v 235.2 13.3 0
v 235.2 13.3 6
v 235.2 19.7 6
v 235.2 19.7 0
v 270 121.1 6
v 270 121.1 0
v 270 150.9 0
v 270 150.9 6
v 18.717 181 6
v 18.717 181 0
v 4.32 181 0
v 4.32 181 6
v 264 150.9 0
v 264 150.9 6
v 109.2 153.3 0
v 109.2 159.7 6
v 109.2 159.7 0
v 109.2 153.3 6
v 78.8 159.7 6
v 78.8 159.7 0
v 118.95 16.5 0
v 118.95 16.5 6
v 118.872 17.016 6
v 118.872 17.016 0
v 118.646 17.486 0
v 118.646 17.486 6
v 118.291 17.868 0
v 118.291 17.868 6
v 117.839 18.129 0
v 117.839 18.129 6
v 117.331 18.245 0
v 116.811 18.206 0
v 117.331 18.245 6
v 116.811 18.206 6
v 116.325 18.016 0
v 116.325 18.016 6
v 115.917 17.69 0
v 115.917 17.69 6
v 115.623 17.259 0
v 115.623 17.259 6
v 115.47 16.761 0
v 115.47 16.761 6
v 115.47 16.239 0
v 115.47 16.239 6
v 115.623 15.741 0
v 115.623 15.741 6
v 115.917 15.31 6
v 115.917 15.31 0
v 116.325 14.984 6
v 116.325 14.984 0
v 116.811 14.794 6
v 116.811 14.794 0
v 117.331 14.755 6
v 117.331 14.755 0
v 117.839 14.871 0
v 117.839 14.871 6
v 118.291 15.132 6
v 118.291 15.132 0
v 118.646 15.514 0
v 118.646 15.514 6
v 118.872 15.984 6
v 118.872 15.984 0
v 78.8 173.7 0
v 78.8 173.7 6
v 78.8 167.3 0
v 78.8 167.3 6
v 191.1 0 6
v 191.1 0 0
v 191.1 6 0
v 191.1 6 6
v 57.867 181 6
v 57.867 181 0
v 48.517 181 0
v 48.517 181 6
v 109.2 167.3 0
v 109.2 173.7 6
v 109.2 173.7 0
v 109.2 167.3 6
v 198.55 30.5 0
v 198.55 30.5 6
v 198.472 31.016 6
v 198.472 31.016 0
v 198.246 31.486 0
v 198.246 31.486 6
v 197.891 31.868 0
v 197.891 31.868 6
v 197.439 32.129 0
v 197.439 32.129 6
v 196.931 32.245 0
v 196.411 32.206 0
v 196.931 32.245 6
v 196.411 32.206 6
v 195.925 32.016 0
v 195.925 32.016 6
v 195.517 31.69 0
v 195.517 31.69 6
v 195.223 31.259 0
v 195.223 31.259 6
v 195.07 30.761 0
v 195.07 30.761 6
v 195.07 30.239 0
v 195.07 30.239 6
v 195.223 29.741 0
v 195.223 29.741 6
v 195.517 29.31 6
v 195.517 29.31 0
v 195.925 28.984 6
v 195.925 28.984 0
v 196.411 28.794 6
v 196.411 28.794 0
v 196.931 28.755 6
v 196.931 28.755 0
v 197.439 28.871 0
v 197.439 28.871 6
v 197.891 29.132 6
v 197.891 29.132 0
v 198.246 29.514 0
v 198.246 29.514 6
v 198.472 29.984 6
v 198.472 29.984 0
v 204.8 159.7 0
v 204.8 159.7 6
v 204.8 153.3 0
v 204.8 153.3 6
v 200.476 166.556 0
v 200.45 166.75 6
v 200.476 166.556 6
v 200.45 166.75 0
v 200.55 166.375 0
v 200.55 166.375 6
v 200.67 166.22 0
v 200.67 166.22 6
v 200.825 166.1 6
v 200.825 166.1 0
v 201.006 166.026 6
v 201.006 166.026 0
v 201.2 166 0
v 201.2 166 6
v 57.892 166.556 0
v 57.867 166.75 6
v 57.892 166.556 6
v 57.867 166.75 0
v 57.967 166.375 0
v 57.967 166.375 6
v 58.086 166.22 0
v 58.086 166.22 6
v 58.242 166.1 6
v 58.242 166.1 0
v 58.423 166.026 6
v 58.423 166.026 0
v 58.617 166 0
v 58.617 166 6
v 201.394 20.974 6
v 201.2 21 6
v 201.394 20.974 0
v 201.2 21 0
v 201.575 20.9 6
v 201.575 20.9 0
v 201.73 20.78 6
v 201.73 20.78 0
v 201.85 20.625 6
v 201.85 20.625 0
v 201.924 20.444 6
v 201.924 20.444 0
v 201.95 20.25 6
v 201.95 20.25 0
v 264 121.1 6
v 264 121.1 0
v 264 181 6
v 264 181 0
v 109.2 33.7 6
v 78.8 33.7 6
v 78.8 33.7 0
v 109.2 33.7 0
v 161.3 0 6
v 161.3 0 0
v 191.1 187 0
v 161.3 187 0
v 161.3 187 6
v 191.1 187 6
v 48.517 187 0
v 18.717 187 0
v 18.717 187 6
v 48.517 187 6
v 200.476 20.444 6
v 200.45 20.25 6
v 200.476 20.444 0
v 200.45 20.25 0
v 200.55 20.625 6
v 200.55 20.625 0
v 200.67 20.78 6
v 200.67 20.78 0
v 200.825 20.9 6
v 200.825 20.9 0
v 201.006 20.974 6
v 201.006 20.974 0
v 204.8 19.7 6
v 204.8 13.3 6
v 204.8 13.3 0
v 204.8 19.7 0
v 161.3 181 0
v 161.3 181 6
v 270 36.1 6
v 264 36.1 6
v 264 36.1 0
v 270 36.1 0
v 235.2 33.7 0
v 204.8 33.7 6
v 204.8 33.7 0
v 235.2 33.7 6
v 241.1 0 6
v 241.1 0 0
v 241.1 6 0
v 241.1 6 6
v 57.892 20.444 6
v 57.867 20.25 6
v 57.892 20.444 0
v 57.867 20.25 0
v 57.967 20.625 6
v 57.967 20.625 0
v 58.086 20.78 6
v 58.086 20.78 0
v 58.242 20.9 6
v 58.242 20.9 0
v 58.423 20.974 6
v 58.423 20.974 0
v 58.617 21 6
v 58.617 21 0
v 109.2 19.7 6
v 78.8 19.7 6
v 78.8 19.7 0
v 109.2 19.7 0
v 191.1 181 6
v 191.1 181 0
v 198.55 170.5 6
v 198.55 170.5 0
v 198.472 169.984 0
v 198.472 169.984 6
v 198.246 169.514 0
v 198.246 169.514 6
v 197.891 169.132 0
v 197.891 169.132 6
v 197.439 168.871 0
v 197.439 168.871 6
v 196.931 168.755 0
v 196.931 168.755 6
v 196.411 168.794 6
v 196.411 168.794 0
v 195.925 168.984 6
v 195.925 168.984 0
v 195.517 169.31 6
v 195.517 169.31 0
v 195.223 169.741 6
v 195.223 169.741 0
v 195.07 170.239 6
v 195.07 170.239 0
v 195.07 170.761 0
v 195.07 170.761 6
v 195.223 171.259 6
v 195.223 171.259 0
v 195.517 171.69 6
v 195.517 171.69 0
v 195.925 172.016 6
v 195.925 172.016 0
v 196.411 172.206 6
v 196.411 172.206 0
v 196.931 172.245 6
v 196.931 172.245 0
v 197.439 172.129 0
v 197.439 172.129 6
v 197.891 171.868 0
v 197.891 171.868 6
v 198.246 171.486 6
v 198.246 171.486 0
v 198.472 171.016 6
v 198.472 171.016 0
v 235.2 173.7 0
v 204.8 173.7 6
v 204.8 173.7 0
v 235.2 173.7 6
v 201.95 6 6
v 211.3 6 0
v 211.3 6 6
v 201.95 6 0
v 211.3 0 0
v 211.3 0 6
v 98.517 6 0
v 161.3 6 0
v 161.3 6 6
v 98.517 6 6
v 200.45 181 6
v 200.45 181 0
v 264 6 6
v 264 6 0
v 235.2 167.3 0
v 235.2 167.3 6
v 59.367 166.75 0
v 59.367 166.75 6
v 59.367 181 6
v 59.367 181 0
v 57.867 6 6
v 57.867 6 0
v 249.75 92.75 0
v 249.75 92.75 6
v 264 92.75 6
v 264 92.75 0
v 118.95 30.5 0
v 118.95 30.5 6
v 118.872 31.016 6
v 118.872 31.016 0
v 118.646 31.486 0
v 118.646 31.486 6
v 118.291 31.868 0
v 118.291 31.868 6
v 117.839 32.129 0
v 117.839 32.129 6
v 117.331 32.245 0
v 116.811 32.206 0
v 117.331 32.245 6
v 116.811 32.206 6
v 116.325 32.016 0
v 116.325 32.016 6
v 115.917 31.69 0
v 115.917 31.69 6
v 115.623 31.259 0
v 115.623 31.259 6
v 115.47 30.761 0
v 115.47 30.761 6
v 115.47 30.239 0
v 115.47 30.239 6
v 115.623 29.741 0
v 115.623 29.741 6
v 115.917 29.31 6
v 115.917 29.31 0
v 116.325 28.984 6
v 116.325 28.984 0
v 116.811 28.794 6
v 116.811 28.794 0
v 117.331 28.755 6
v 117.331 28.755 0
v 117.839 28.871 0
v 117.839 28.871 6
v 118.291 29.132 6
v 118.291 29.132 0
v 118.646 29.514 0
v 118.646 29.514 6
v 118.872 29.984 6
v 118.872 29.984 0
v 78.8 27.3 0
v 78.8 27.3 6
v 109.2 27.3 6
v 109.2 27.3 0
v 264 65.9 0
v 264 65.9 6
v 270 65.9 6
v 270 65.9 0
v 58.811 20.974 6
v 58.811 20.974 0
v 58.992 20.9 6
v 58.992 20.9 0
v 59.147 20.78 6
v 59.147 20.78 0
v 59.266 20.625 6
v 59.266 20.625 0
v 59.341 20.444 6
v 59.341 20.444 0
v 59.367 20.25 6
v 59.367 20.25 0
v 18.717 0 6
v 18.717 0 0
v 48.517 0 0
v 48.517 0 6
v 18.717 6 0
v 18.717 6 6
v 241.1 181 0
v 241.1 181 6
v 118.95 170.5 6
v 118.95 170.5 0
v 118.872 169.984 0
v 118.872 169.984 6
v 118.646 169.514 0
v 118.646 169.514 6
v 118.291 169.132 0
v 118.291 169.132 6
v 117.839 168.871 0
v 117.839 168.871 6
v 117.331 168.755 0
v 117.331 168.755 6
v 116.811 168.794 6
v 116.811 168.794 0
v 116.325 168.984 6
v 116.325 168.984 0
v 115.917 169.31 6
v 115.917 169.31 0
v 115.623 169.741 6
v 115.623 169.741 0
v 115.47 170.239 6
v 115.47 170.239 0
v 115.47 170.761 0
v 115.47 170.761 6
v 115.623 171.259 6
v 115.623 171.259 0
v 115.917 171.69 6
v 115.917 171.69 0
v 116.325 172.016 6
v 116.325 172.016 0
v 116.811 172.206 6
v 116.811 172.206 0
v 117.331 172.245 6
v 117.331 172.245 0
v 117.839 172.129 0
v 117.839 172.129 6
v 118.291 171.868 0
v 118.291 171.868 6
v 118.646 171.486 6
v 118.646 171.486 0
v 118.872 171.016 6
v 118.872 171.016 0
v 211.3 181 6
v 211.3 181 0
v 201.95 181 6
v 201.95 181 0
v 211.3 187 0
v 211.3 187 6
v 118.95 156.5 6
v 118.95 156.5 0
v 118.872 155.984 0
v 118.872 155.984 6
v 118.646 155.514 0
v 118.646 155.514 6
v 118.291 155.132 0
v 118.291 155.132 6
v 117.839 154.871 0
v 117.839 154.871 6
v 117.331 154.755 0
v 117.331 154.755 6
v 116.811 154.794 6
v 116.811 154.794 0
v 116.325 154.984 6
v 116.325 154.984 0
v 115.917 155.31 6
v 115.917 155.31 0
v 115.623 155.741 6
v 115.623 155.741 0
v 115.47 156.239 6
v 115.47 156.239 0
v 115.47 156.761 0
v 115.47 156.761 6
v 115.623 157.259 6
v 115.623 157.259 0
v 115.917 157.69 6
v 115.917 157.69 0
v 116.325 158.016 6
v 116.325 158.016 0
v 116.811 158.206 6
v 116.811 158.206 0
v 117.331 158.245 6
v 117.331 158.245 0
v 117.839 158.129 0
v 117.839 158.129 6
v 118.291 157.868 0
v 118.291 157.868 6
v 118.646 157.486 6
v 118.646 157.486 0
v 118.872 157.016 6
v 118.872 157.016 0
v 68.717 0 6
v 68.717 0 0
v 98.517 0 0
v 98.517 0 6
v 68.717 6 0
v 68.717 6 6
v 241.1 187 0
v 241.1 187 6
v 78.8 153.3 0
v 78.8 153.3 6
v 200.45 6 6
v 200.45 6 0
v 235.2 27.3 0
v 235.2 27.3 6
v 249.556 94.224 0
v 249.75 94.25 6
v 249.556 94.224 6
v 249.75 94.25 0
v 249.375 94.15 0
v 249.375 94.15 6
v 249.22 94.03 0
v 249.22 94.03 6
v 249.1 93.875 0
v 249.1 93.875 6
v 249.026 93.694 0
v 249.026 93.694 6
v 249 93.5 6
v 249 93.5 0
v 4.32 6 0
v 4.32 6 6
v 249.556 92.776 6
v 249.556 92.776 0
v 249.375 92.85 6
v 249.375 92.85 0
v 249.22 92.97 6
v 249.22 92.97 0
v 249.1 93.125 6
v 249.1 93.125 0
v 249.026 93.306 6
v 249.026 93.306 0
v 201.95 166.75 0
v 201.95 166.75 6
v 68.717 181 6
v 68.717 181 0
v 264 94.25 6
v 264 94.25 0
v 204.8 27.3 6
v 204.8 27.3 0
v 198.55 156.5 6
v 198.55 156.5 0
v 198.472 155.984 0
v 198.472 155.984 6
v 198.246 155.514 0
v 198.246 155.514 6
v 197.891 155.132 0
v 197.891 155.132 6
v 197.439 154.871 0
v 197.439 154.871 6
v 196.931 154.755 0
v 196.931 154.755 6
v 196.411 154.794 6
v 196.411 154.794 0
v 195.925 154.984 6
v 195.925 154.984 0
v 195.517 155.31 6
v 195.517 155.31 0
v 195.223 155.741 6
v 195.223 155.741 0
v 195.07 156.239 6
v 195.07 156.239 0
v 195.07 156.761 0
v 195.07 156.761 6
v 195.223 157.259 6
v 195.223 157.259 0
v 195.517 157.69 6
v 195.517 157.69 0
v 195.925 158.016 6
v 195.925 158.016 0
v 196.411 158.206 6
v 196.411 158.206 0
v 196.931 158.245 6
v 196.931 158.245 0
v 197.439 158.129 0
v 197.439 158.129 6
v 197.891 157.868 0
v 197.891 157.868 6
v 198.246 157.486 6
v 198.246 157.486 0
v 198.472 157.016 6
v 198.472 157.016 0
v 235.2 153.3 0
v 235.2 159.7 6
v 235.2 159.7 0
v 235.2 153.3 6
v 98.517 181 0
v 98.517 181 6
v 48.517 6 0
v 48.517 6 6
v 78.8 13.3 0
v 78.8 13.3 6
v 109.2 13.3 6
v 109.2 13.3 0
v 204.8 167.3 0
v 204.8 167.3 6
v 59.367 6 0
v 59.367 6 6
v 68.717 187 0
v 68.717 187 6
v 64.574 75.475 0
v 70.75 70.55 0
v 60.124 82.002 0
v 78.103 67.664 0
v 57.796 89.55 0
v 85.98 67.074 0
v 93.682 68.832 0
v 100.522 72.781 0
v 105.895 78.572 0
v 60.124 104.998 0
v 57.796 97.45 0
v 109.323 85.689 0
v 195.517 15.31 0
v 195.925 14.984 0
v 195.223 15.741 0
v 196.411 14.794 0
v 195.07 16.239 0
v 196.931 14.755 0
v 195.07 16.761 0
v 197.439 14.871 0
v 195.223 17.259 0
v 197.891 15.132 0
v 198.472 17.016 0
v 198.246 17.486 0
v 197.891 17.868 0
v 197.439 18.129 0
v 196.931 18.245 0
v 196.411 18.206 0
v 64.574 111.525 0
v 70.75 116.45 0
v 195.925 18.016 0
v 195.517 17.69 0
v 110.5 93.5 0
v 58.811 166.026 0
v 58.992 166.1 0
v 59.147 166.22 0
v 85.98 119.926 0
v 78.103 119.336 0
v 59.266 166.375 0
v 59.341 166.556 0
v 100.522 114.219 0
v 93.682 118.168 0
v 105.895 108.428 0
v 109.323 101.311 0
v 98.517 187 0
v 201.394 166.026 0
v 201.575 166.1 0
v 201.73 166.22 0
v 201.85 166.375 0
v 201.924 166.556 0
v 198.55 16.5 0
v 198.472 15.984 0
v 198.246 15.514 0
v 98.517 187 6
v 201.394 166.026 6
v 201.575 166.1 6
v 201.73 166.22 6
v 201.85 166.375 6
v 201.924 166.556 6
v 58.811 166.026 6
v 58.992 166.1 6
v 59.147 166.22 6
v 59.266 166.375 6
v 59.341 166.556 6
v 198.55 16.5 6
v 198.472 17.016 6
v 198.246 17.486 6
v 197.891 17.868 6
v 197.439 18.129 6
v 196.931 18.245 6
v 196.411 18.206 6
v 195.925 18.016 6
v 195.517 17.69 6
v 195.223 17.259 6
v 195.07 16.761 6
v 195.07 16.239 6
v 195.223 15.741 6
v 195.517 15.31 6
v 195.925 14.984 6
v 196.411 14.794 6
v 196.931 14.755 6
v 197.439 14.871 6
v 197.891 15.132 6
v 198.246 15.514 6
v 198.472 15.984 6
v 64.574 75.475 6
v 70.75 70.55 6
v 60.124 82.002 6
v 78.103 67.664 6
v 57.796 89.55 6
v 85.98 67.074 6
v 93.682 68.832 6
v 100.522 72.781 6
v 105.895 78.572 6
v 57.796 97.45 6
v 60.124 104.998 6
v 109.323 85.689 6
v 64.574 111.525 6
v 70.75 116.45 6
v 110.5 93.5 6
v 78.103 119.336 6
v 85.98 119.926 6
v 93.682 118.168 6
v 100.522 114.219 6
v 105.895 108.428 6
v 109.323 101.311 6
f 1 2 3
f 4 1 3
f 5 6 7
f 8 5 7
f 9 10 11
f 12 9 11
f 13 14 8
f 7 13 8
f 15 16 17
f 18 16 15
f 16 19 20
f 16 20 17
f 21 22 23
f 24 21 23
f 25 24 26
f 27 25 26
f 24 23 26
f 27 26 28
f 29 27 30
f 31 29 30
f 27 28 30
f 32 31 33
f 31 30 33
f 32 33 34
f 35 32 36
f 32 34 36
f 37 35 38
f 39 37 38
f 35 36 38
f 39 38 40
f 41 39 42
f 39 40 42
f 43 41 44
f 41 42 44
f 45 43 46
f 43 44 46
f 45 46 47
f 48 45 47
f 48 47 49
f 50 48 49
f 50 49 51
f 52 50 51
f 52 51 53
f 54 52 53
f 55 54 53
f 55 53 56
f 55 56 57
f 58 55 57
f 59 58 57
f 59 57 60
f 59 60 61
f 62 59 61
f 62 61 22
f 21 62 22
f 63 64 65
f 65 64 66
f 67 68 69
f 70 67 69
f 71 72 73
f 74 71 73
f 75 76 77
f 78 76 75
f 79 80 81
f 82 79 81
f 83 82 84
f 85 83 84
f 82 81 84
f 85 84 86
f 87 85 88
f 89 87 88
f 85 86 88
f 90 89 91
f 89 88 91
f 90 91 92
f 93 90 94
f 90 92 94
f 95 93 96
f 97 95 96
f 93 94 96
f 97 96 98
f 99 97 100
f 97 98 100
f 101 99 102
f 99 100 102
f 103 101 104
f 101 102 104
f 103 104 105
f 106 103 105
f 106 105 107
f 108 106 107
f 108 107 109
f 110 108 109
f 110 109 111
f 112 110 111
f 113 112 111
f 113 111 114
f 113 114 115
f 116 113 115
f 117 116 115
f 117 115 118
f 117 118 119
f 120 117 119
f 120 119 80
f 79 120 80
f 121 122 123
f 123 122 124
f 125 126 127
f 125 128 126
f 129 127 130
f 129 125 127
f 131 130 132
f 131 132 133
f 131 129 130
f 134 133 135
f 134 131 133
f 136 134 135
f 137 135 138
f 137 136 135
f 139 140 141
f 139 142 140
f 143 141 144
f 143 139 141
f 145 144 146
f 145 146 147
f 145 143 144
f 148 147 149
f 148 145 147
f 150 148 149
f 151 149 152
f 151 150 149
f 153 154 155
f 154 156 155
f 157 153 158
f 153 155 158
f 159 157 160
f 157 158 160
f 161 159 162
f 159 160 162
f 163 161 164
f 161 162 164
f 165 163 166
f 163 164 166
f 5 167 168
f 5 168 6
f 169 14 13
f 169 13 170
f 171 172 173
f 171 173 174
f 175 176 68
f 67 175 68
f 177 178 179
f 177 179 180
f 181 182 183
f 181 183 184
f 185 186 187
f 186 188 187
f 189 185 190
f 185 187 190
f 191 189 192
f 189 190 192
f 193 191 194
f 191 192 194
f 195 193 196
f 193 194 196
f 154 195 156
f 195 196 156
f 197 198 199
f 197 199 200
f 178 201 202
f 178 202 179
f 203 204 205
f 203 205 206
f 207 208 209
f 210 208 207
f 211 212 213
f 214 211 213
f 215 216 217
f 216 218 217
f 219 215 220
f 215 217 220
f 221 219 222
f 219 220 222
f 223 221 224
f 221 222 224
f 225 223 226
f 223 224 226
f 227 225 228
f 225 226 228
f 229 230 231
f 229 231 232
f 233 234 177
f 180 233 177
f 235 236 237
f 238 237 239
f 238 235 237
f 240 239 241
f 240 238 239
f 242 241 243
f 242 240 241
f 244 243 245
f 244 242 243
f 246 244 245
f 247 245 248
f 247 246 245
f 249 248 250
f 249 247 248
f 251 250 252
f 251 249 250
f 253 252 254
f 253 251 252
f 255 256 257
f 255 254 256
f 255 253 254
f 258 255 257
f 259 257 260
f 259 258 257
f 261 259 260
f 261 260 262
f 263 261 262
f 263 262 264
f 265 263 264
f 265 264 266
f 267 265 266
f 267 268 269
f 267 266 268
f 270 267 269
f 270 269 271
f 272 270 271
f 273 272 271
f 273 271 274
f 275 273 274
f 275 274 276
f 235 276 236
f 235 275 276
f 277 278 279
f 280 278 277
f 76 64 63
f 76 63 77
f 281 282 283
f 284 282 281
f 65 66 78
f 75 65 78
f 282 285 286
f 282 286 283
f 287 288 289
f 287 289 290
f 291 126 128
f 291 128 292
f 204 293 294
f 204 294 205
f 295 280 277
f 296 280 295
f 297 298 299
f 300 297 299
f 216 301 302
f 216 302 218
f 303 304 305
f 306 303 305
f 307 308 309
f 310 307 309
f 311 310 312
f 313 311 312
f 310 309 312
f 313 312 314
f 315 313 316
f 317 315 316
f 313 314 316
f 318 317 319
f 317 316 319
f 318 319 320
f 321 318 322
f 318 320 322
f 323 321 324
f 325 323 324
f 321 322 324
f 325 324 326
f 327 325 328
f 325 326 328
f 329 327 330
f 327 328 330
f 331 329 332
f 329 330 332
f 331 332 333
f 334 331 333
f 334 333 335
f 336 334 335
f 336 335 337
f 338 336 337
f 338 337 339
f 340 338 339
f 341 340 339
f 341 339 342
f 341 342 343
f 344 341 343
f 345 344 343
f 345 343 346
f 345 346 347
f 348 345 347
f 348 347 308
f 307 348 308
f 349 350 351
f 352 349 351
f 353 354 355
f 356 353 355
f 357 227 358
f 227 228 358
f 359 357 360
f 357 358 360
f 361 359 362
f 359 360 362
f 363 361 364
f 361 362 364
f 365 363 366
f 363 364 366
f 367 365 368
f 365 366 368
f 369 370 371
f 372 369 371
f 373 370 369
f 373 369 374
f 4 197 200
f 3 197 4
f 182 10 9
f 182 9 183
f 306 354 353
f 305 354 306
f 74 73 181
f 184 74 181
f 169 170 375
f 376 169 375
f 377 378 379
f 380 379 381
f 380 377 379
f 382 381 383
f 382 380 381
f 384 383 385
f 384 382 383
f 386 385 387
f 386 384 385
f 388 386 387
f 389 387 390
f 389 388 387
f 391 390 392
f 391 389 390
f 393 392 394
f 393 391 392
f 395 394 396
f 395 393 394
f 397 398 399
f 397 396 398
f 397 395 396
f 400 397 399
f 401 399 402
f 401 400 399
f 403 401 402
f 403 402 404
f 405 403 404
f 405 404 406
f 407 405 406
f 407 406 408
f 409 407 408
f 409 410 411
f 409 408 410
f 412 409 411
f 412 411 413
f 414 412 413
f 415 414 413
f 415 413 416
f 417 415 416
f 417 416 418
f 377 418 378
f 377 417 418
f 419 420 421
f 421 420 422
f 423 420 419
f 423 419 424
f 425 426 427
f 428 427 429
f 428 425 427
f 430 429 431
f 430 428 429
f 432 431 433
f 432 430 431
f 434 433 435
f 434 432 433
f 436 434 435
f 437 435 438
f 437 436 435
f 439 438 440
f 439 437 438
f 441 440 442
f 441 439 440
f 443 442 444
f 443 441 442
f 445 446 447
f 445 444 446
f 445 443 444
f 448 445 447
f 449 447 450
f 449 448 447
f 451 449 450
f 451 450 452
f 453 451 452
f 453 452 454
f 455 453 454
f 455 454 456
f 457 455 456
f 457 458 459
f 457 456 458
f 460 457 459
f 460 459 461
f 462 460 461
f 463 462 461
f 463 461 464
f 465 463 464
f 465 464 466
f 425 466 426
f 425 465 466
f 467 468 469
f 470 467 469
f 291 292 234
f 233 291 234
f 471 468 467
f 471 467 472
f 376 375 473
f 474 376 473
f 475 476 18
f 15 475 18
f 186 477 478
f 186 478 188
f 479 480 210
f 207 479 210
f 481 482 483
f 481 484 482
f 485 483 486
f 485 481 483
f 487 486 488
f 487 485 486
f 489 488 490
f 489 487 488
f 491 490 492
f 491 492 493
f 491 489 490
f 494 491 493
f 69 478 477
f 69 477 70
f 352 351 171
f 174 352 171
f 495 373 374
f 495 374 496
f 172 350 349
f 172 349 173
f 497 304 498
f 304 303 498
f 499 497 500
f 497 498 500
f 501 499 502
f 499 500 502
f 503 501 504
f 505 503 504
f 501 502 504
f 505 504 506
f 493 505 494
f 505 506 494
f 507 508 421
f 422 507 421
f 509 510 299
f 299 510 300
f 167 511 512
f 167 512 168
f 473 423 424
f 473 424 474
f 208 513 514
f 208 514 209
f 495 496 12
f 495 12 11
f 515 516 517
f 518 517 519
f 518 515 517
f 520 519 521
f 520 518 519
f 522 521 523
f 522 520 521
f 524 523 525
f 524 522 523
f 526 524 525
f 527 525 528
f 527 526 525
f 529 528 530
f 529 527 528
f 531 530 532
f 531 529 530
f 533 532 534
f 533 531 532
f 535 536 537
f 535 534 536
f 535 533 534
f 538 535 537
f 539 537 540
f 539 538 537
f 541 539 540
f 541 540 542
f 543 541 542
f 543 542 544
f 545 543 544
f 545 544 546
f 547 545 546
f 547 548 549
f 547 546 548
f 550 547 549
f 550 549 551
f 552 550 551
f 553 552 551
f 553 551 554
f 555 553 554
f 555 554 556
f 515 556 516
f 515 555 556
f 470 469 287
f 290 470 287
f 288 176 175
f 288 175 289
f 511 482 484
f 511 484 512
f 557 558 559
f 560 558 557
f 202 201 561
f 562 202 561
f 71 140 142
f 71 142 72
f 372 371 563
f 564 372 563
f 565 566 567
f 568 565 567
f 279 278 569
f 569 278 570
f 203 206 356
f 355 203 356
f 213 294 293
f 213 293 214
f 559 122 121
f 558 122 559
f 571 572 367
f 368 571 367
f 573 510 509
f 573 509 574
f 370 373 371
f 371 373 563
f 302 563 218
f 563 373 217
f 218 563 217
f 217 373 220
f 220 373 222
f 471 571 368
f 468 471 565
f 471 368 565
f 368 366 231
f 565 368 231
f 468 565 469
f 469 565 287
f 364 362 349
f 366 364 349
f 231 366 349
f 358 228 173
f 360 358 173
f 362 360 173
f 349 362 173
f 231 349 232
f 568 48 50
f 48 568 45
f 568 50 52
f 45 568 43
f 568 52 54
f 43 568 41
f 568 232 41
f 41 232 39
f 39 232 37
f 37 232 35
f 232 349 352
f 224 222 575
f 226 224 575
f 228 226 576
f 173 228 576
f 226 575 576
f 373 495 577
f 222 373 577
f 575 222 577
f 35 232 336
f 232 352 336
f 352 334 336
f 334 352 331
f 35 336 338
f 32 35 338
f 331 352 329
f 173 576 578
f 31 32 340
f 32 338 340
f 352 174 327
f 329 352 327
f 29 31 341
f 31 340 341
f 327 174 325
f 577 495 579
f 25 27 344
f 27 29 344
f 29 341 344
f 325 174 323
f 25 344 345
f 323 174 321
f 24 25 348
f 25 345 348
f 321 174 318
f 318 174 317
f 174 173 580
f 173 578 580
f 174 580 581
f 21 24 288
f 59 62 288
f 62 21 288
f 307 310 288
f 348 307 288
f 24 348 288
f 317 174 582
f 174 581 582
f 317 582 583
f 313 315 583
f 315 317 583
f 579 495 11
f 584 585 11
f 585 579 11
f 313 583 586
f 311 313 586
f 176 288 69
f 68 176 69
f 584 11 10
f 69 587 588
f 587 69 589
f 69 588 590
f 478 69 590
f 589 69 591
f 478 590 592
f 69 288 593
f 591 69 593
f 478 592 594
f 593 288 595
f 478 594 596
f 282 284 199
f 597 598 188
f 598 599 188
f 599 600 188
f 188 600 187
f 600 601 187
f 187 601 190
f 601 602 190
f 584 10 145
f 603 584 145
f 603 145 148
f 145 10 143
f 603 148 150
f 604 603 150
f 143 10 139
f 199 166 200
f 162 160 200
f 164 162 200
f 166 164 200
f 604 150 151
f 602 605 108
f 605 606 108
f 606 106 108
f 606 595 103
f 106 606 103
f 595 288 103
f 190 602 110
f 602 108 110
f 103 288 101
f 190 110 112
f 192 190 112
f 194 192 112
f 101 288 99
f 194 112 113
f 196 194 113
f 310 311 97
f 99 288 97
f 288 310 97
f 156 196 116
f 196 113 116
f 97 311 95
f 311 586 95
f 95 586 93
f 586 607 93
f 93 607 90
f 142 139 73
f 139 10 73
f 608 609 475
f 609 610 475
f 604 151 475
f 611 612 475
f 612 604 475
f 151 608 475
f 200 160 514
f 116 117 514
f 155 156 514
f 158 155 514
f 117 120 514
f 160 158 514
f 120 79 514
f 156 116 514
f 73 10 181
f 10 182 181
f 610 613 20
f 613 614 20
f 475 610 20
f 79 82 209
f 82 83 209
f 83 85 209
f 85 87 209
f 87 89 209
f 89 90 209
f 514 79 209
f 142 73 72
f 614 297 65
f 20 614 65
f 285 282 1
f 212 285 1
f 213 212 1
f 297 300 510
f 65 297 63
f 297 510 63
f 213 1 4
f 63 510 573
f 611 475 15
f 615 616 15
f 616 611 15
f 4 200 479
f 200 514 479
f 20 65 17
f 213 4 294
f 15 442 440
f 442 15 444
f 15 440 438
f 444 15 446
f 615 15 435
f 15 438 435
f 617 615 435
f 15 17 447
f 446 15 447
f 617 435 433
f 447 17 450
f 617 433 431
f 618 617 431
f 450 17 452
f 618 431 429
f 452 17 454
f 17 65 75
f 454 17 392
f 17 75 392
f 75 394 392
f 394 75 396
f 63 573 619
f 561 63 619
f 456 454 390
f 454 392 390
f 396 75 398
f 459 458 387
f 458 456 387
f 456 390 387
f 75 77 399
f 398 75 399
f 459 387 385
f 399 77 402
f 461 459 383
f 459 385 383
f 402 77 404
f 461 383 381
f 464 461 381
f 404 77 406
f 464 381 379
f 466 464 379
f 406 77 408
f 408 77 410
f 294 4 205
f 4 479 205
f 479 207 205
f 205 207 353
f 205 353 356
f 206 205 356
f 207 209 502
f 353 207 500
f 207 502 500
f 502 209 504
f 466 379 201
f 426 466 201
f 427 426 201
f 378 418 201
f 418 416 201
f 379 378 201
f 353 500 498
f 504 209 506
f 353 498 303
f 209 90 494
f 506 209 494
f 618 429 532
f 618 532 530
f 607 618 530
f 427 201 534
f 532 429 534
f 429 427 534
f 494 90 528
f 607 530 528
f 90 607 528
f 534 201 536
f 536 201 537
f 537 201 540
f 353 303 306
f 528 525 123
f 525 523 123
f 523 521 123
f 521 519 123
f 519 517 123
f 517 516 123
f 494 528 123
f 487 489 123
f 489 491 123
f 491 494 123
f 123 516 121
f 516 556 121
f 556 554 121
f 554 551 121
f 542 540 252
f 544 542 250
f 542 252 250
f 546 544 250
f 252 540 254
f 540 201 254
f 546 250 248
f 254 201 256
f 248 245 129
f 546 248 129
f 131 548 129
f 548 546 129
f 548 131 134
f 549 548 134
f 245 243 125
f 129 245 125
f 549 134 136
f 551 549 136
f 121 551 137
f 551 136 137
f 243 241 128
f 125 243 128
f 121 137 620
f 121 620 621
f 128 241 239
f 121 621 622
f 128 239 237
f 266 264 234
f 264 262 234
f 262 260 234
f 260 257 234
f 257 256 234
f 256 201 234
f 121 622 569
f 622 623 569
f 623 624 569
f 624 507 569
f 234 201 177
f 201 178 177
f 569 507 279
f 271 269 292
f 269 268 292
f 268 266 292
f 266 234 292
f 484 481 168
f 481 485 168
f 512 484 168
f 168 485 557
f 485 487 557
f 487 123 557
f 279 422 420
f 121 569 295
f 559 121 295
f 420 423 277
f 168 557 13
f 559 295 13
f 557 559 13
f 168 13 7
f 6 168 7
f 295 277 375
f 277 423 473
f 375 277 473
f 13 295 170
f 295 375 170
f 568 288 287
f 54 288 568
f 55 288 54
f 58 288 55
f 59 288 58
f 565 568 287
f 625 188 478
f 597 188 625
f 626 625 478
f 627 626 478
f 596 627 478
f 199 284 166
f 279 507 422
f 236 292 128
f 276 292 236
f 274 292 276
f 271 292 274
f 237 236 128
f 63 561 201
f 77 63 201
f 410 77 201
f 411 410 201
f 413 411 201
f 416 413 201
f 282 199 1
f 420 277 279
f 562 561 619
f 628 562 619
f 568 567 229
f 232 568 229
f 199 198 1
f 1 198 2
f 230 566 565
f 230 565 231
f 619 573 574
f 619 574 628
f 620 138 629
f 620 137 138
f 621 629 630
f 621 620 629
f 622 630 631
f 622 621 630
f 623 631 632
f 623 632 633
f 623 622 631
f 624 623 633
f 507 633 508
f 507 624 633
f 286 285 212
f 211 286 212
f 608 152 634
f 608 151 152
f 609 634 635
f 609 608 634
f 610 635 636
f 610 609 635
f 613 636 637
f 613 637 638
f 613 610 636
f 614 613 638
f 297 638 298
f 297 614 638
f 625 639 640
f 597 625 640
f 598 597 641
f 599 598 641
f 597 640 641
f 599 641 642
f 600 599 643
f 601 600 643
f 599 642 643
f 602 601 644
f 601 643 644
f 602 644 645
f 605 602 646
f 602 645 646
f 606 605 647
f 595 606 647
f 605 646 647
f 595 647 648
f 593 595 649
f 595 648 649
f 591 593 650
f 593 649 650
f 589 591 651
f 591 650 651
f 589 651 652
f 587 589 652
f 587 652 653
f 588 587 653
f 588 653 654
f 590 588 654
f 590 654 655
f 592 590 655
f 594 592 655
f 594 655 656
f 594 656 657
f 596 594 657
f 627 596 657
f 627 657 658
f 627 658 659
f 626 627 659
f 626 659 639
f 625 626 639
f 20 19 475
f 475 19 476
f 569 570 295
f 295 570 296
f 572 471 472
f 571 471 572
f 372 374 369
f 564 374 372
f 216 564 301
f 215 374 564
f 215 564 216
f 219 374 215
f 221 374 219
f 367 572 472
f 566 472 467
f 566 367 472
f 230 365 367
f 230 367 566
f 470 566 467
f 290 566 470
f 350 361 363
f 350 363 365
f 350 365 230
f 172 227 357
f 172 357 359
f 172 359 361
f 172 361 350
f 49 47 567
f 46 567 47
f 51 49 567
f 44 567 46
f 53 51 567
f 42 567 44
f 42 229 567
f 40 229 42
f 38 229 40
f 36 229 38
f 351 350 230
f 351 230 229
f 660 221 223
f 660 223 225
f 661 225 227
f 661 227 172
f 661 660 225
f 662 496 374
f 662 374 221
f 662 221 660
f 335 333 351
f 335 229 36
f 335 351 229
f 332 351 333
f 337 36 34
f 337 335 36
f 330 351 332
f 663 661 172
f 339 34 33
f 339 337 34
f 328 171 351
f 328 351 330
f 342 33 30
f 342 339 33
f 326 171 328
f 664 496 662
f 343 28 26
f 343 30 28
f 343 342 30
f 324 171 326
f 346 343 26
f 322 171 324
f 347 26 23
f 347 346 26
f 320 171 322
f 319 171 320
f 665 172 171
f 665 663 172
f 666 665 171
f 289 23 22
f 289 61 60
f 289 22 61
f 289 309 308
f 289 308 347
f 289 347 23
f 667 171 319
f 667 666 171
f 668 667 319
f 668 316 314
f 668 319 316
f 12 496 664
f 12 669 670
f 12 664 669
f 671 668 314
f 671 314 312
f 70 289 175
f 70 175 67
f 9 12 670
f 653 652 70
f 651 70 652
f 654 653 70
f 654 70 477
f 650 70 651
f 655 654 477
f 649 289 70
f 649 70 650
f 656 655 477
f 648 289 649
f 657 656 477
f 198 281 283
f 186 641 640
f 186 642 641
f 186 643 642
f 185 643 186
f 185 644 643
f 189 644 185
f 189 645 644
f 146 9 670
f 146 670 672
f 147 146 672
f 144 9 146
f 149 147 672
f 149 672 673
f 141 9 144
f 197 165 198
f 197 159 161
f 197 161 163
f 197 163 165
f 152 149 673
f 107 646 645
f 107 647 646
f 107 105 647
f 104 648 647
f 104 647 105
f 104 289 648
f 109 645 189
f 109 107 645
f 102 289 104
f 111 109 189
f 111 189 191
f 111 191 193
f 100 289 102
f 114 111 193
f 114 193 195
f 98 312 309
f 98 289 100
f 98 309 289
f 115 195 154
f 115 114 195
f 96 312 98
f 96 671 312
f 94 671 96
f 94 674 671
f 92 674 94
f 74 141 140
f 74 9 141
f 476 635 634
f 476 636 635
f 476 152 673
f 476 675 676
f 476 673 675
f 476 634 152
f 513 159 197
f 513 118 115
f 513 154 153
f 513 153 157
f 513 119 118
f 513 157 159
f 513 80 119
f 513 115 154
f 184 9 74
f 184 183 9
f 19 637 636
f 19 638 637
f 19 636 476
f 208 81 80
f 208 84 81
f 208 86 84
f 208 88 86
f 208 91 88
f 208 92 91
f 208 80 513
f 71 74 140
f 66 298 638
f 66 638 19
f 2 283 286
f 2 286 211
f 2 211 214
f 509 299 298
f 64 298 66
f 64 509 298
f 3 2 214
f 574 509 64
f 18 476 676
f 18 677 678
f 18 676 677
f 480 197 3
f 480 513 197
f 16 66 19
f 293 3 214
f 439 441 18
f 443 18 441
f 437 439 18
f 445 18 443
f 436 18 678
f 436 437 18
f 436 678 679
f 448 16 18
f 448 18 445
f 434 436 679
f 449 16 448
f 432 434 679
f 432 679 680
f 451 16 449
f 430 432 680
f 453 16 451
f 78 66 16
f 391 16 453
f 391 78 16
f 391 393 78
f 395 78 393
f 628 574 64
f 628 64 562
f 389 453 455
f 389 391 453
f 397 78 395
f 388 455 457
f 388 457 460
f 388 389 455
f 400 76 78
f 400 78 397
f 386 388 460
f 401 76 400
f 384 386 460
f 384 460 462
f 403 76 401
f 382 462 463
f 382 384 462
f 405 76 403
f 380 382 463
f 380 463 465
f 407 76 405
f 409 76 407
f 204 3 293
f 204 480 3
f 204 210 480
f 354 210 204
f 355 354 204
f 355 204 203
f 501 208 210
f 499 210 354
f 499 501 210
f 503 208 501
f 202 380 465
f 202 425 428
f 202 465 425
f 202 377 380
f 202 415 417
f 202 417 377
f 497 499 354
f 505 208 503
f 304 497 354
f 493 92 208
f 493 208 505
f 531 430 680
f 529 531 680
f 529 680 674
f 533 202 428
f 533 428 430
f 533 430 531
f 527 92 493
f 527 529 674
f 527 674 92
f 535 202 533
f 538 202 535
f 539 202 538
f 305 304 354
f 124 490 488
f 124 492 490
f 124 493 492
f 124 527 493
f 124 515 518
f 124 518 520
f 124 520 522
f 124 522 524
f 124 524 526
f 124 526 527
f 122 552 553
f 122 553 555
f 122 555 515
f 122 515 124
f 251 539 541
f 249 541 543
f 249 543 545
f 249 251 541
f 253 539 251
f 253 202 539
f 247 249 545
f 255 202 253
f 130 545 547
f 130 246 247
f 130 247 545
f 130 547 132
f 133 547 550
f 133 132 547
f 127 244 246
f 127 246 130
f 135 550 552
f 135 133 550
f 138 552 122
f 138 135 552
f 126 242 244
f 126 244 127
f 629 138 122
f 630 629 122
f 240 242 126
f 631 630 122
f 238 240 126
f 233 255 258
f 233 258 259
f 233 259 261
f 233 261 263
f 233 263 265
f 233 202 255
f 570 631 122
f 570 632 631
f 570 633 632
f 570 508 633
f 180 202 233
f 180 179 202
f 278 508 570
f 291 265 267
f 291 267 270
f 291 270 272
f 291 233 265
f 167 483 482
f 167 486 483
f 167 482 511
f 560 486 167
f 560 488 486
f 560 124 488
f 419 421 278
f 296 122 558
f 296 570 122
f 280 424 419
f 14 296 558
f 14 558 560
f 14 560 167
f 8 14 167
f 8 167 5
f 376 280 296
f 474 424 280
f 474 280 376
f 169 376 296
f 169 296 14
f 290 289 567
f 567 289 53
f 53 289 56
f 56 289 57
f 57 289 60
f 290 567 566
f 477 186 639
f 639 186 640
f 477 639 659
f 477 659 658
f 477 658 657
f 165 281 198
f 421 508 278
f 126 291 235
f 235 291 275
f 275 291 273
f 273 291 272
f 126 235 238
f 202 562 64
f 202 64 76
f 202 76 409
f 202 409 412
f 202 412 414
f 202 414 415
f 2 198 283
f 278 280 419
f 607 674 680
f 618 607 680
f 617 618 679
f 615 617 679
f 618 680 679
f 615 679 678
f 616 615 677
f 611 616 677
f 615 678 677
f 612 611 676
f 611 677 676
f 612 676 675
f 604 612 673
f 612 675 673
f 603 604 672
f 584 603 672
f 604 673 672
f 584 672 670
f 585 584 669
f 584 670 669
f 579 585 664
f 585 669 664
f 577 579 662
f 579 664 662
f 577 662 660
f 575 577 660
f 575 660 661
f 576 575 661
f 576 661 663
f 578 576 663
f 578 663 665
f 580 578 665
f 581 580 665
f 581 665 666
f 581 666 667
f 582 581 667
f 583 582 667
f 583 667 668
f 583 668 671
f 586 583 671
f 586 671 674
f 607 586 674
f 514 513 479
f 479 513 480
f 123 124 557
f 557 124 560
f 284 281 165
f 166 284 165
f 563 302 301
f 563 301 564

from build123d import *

# Parameters (mm, degrees)
ESBO_O1_W                = 270
ESBO_O1_H                = 187
RESSALTO_EXTRUS_O1_DEPTH = 6
ESBO_O2_W                = 30.1
ESBO_O2_H                = 6
ESBO_O2_W_2              = 20.2
ESBO_O2_W_3              = 62.783302492
ESBO_O2_W_4              = 18.716697508
CORTE_EXTRUS_O1_DEPTH    = 6
ESBO_O3_W                = 6
ESBO_O3_H                = 30.1
ESBO_O3_H_2              = 55.2
CORTE_EXTRUS_O2_DEPTH    = 6
ESBO_O4_W                = 0.75
ESBO_O4_H                = 15
ESBO_O4_W_2              = 1.5
ESBO_O4_W_3              = 15
ESBO_O4_H_2              = 1.5
CORTE_EXTRUS_O3_DEPTH    = 6
ESBO_O7_W                = 4.32
ESBO_O7_H                = 6
CORTE_EXTRUS_O4_DEPTH    = 194.4
ESBO_O8_W                = 30.4
ESBO_O8_H                = 6.4
ESBO_O8_R                = 1.75
CORTE_EXTRUS_O5_DEPTH    = 25.5
ESBO_O10_R               = 26.5
CORTE_EXTRUS_O6_DEPTH    = 25.5
FILETE1_R                = 0.75


with BuildPart() as part:
    # Esboço1 → Ressalto-extrusão1 (new body)
    with BuildSketch(Plane.XY):
        with Locations((135, 93.5)):
            Rectangle(ESBO_O1_W, ESBO_O1_H)
    extrude(amount=RESSALTO_EXTRUS_O1_DEPTH)

    # Esboço2 → Corte-extrusão1 (cut)
    with BuildSketch(Plane(origin=(0, 0, 0), x_dir=(-1, 0, 0), z_dir=(0, 0, -1))):
        with Locations((-256.15, 184)):
            Rectangle(ESBO_O2_W, ESBO_O2_H)
        with Locations((-201.2, 184)):
            Rectangle(ESBO_O2_W_2, ESBO_O2_H)
        with Locations((-129.908348754, 184)):
            Rectangle(ESBO_O2_W_3, ESBO_O2_H)
        with Locations((-58.616697508, 184)):
            Rectangle(ESBO_O2_W_2, ESBO_O2_H)
        with Locations((-9.358348754, 184)):
            Rectangle(ESBO_O2_W_4, ESBO_O2_H)
        with Locations((-9.358348754, 3)):
            Rectangle(ESBO_O2_W_4, ESBO_O2_H)
        with Locations((-58.616697508, 3)):
            Rectangle(ESBO_O2_W_2, ESBO_O2_H)
        with Locations((-129.908348754, 3)):
            Rectangle(ESBO_O2_W_3, ESBO_O2_H)
        with Locations((-201.2, 3)):
            Rectangle(ESBO_O2_W_2, ESBO_O2_H)
        with Locations((-256.15, 3)):
            Rectangle(ESBO_O2_W, ESBO_O2_H)
    extrude(amount=-CORTE_EXTRUS_O1_DEPTH, mode=Mode.SUBTRACT)

    # Esboço3 → Corte-extrusão2 (cut)
    with BuildSketch(Plane.XY.offset(6)):
        with Locations((267, 165.95)):
            Rectangle(ESBO_O3_W, ESBO_O3_H)
        with Locations((267, 93.5)):
            Rectangle(ESBO_O3_W, ESBO_O3_H_2)
        with Locations((267, 21.05)):
            Rectangle(ESBO_O3_W, ESBO_O3_H)
    extrude(amount=-CORTE_EXTRUS_O2_DEPTH, mode=Mode.SUBTRACT)

    # Esboço4 → Corte-extrusão3 (cut)
    with BuildSketch(Plane.XY.offset(6)):
        with Locations((58.241697508, 173.5)):
            Rectangle(ESBO_O4_W, ESBO_O4_H)
        with Locations((58.991697508, 173.5)):
            Rectangle(ESBO_O4_W, ESBO_O4_H)
        with Locations((58.241697508, 13.5)):
            Rectangle(ESBO_O4_W, ESBO_O4_H)
        with Locations((58.991697508, 13.5)):
            Rectangle(ESBO_O4_W, ESBO_O4_H)
        with Locations((201.2, 13.5)):
            Rectangle(ESBO_O4_W_2, ESBO_O4_H)
        with Locations((256.5, 93.5)):
            Rectangle(ESBO_O4_W_3, ESBO_O4_H_2)
        with Locations((201.2, 173.5)):
            Rectangle(ESBO_O4_W_2, ESBO_O4_H)
    extrude(amount=-CORTE_EXTRUS_O3_DEPTH, mode=Mode.SUBTRACT)

    # Esboço7 → Corte-extrusão4 (cut)
    with BuildSketch(Plane(origin=(0, 6, 0), x_dir=(1, 0, 0), z_dir=(0, 1, 0))):
        with Locations((2.16, -3)):
            Rectangle(ESBO_O7_W, ESBO_O7_H)
    extrude(amount=CORTE_EXTRUS_O4_DEPTH, mode=Mode.SUBTRACT)

    # Esboço8 → Corte-extrusão5 (cut)
    with BuildSketch(Plane.XY.offset(6)):
        with Locations((94, 30.5)):
            Rectangle(ESBO_O8_W, ESBO_O8_H)
        with Locations((94, 16.5)):
            Rectangle(ESBO_O8_W, ESBO_O8_H)
        with Locations((220, 16.5)):
            Rectangle(ESBO_O8_W, ESBO_O8_H)
        with Locations((220, 30.5)):
            Rectangle(ESBO_O8_W, ESBO_O8_H)
        with Locations((117.2, 30.5)):
            Circle(ESBO_O8_R)
        with Locations((117.2, 16.5)):
            Circle(ESBO_O8_R)
        with Locations((196.8, 30.5)):
            Circle(ESBO_O8_R)
        with Locations((196.8, 16.5)):
            Circle(ESBO_O8_R)
    corte_extrus_o5 = extrude(amount=-CORTE_EXTRUS_O5_DEPTH, mode=Mode.SUBTRACT)

    # Espelhar1: Corte-extrusão5 across plane
    add(corte_extrus_o5.mirror(Plane(origin=(0, 93.5, 0), x_dir=(0, 0, 1), z_dir=(0, -1, 0))), mode=Mode.SUBTRACT)

    # Esboço10 → Corte-extrusão6 (cut)
    with BuildSketch(Plane.XY.offset(6)):
        with Locations((84, 93.5)):
            Circle(ESBO_O10_R)
    extrude(amount=-CORTE_EXTRUS_O6_DEPTH, mode=Mode.SUBTRACT)

    # Filete1
    filete1_edges = [part.edges().sort_by_distance(p)[0] for p in [
        (59.366697508, 166, 3),
        (57.866697508, 166, 3),
        (200.45, 166, 3),
        (201.95, 166, 3),
        (249, 92.75, 3),
        (249, 94.25, 3),
        (201.95, 21, 3),
        (200.45, 21, 3),
        (57.866697508, 21, 3),
        (59.366697508, 21, 3),
    ]]
    fillet(filete1_edges, radius=FILETE1_R - 0.0001)  # a hair under: the kernel refuses the full size


solid = part.part
